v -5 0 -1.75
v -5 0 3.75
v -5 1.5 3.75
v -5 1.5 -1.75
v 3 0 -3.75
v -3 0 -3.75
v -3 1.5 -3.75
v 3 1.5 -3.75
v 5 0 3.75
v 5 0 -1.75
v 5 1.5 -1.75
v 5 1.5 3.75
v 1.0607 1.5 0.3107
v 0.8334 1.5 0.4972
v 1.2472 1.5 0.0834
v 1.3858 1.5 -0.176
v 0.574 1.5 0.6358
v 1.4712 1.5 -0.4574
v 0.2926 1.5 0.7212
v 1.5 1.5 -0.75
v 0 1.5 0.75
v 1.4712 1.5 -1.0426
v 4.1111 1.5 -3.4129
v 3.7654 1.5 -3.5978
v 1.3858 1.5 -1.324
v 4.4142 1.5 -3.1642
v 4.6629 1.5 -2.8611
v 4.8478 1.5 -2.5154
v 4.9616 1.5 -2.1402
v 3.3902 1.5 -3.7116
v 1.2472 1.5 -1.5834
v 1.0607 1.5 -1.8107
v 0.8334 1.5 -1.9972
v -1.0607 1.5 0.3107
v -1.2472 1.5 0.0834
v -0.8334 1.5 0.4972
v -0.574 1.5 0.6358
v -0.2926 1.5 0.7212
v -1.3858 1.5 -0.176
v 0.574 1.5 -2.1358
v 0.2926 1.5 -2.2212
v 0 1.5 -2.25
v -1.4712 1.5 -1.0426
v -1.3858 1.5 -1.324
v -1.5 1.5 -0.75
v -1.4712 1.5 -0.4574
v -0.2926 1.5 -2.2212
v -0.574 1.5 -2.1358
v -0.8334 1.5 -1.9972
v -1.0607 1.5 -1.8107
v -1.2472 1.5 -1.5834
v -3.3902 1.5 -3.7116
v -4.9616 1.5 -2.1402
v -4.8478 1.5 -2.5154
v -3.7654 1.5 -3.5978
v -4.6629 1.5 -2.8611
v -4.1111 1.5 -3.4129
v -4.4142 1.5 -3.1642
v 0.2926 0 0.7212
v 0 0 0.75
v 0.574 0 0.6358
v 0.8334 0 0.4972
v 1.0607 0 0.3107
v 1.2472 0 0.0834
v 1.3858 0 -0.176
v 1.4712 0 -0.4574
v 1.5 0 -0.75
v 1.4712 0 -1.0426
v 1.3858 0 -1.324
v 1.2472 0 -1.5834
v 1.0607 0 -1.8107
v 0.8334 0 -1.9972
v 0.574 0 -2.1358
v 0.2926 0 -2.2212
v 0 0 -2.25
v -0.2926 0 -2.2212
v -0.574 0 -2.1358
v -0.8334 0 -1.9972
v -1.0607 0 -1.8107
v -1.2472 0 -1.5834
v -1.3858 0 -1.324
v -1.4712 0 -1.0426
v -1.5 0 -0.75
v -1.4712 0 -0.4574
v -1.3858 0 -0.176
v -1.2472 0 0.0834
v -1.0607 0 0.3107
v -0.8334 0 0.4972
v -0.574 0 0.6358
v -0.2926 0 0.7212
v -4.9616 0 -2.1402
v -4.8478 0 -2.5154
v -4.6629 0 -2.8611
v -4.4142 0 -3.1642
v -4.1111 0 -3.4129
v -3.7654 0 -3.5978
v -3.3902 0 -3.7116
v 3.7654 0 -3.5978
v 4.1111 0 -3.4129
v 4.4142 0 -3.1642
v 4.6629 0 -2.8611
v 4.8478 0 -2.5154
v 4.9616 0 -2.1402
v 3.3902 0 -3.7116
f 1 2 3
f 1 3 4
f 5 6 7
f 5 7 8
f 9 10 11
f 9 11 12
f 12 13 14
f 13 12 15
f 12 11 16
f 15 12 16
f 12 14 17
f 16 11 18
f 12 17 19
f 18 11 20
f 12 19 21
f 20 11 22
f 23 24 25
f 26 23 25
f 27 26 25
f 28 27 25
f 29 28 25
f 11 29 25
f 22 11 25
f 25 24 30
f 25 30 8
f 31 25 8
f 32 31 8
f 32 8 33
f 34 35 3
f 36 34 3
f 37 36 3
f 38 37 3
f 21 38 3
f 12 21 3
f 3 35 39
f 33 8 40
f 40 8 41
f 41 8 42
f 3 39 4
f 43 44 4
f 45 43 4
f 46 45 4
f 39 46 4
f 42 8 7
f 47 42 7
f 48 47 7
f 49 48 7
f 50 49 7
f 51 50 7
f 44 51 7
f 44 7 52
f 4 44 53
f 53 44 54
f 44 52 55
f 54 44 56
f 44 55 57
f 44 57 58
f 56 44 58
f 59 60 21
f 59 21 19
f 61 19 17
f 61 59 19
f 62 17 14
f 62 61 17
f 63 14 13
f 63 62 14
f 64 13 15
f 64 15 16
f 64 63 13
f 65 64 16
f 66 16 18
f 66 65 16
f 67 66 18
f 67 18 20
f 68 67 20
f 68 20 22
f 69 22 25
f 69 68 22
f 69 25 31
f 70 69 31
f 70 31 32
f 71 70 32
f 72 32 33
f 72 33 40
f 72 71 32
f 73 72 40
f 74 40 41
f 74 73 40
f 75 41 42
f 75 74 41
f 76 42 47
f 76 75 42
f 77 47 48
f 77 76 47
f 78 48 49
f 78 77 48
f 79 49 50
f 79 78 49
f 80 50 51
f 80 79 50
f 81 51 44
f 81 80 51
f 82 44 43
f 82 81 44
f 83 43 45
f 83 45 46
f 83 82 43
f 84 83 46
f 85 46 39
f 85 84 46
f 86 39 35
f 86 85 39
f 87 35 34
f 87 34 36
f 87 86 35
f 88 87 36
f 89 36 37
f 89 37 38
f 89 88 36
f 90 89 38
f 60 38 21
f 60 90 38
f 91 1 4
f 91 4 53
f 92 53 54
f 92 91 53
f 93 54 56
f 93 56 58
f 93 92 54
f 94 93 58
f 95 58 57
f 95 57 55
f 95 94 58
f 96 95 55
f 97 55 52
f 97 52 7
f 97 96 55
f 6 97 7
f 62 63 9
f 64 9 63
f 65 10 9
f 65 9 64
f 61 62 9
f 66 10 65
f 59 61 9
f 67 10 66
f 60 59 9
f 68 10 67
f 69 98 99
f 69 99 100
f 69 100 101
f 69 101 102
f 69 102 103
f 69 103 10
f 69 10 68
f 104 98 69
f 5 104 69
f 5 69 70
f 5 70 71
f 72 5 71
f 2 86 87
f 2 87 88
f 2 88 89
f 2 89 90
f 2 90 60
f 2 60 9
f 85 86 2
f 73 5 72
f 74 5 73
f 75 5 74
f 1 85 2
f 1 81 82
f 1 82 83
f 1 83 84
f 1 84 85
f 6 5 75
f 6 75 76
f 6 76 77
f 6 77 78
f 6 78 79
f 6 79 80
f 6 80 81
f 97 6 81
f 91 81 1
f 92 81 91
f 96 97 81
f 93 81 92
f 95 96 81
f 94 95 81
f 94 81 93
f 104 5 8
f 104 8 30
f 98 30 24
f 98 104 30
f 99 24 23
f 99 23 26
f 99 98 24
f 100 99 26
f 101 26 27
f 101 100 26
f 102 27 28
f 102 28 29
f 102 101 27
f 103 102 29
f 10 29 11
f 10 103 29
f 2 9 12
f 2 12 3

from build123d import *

# Parameters (mm, degrees)
ESBO_O1_R                = 1.5
RESSALTO_EXTRUS_O1_DEPTH = 1.5


with BuildPart() as part:
    # Esboço1 → Ressalto-extrusão1 (new body)
    with BuildSketch(Plane(origin=(0, 0, 0), x_dir=(1, 0, 0), z_dir=(0, 1, 0))):
        with BuildLine():
            Line((-5, -3.75), (-5, 1.75))
            ThreePointArc((-5, 1.75), (-4.414213562, 3.164213562), (-3, 3.75))
            Line((-3, 3.75), (3, 3.75))
            ThreePointArc((3, 3.75), (4.414213562, 3.164213562), (5, 1.75))
            Line((5, 1.75), (5, -3.75))
            Line((5, -3.75), (-5, -3.75))
        make_face()
        with Locations(Location((0, 0.75, 0), (0, 0, 270))):
            Circle(ESBO_O1_R, mode=Mode.SUBTRACT)
    extrude(amount=RESSALTO_EXTRUS_O1_DEPTH)


solid = part.part
